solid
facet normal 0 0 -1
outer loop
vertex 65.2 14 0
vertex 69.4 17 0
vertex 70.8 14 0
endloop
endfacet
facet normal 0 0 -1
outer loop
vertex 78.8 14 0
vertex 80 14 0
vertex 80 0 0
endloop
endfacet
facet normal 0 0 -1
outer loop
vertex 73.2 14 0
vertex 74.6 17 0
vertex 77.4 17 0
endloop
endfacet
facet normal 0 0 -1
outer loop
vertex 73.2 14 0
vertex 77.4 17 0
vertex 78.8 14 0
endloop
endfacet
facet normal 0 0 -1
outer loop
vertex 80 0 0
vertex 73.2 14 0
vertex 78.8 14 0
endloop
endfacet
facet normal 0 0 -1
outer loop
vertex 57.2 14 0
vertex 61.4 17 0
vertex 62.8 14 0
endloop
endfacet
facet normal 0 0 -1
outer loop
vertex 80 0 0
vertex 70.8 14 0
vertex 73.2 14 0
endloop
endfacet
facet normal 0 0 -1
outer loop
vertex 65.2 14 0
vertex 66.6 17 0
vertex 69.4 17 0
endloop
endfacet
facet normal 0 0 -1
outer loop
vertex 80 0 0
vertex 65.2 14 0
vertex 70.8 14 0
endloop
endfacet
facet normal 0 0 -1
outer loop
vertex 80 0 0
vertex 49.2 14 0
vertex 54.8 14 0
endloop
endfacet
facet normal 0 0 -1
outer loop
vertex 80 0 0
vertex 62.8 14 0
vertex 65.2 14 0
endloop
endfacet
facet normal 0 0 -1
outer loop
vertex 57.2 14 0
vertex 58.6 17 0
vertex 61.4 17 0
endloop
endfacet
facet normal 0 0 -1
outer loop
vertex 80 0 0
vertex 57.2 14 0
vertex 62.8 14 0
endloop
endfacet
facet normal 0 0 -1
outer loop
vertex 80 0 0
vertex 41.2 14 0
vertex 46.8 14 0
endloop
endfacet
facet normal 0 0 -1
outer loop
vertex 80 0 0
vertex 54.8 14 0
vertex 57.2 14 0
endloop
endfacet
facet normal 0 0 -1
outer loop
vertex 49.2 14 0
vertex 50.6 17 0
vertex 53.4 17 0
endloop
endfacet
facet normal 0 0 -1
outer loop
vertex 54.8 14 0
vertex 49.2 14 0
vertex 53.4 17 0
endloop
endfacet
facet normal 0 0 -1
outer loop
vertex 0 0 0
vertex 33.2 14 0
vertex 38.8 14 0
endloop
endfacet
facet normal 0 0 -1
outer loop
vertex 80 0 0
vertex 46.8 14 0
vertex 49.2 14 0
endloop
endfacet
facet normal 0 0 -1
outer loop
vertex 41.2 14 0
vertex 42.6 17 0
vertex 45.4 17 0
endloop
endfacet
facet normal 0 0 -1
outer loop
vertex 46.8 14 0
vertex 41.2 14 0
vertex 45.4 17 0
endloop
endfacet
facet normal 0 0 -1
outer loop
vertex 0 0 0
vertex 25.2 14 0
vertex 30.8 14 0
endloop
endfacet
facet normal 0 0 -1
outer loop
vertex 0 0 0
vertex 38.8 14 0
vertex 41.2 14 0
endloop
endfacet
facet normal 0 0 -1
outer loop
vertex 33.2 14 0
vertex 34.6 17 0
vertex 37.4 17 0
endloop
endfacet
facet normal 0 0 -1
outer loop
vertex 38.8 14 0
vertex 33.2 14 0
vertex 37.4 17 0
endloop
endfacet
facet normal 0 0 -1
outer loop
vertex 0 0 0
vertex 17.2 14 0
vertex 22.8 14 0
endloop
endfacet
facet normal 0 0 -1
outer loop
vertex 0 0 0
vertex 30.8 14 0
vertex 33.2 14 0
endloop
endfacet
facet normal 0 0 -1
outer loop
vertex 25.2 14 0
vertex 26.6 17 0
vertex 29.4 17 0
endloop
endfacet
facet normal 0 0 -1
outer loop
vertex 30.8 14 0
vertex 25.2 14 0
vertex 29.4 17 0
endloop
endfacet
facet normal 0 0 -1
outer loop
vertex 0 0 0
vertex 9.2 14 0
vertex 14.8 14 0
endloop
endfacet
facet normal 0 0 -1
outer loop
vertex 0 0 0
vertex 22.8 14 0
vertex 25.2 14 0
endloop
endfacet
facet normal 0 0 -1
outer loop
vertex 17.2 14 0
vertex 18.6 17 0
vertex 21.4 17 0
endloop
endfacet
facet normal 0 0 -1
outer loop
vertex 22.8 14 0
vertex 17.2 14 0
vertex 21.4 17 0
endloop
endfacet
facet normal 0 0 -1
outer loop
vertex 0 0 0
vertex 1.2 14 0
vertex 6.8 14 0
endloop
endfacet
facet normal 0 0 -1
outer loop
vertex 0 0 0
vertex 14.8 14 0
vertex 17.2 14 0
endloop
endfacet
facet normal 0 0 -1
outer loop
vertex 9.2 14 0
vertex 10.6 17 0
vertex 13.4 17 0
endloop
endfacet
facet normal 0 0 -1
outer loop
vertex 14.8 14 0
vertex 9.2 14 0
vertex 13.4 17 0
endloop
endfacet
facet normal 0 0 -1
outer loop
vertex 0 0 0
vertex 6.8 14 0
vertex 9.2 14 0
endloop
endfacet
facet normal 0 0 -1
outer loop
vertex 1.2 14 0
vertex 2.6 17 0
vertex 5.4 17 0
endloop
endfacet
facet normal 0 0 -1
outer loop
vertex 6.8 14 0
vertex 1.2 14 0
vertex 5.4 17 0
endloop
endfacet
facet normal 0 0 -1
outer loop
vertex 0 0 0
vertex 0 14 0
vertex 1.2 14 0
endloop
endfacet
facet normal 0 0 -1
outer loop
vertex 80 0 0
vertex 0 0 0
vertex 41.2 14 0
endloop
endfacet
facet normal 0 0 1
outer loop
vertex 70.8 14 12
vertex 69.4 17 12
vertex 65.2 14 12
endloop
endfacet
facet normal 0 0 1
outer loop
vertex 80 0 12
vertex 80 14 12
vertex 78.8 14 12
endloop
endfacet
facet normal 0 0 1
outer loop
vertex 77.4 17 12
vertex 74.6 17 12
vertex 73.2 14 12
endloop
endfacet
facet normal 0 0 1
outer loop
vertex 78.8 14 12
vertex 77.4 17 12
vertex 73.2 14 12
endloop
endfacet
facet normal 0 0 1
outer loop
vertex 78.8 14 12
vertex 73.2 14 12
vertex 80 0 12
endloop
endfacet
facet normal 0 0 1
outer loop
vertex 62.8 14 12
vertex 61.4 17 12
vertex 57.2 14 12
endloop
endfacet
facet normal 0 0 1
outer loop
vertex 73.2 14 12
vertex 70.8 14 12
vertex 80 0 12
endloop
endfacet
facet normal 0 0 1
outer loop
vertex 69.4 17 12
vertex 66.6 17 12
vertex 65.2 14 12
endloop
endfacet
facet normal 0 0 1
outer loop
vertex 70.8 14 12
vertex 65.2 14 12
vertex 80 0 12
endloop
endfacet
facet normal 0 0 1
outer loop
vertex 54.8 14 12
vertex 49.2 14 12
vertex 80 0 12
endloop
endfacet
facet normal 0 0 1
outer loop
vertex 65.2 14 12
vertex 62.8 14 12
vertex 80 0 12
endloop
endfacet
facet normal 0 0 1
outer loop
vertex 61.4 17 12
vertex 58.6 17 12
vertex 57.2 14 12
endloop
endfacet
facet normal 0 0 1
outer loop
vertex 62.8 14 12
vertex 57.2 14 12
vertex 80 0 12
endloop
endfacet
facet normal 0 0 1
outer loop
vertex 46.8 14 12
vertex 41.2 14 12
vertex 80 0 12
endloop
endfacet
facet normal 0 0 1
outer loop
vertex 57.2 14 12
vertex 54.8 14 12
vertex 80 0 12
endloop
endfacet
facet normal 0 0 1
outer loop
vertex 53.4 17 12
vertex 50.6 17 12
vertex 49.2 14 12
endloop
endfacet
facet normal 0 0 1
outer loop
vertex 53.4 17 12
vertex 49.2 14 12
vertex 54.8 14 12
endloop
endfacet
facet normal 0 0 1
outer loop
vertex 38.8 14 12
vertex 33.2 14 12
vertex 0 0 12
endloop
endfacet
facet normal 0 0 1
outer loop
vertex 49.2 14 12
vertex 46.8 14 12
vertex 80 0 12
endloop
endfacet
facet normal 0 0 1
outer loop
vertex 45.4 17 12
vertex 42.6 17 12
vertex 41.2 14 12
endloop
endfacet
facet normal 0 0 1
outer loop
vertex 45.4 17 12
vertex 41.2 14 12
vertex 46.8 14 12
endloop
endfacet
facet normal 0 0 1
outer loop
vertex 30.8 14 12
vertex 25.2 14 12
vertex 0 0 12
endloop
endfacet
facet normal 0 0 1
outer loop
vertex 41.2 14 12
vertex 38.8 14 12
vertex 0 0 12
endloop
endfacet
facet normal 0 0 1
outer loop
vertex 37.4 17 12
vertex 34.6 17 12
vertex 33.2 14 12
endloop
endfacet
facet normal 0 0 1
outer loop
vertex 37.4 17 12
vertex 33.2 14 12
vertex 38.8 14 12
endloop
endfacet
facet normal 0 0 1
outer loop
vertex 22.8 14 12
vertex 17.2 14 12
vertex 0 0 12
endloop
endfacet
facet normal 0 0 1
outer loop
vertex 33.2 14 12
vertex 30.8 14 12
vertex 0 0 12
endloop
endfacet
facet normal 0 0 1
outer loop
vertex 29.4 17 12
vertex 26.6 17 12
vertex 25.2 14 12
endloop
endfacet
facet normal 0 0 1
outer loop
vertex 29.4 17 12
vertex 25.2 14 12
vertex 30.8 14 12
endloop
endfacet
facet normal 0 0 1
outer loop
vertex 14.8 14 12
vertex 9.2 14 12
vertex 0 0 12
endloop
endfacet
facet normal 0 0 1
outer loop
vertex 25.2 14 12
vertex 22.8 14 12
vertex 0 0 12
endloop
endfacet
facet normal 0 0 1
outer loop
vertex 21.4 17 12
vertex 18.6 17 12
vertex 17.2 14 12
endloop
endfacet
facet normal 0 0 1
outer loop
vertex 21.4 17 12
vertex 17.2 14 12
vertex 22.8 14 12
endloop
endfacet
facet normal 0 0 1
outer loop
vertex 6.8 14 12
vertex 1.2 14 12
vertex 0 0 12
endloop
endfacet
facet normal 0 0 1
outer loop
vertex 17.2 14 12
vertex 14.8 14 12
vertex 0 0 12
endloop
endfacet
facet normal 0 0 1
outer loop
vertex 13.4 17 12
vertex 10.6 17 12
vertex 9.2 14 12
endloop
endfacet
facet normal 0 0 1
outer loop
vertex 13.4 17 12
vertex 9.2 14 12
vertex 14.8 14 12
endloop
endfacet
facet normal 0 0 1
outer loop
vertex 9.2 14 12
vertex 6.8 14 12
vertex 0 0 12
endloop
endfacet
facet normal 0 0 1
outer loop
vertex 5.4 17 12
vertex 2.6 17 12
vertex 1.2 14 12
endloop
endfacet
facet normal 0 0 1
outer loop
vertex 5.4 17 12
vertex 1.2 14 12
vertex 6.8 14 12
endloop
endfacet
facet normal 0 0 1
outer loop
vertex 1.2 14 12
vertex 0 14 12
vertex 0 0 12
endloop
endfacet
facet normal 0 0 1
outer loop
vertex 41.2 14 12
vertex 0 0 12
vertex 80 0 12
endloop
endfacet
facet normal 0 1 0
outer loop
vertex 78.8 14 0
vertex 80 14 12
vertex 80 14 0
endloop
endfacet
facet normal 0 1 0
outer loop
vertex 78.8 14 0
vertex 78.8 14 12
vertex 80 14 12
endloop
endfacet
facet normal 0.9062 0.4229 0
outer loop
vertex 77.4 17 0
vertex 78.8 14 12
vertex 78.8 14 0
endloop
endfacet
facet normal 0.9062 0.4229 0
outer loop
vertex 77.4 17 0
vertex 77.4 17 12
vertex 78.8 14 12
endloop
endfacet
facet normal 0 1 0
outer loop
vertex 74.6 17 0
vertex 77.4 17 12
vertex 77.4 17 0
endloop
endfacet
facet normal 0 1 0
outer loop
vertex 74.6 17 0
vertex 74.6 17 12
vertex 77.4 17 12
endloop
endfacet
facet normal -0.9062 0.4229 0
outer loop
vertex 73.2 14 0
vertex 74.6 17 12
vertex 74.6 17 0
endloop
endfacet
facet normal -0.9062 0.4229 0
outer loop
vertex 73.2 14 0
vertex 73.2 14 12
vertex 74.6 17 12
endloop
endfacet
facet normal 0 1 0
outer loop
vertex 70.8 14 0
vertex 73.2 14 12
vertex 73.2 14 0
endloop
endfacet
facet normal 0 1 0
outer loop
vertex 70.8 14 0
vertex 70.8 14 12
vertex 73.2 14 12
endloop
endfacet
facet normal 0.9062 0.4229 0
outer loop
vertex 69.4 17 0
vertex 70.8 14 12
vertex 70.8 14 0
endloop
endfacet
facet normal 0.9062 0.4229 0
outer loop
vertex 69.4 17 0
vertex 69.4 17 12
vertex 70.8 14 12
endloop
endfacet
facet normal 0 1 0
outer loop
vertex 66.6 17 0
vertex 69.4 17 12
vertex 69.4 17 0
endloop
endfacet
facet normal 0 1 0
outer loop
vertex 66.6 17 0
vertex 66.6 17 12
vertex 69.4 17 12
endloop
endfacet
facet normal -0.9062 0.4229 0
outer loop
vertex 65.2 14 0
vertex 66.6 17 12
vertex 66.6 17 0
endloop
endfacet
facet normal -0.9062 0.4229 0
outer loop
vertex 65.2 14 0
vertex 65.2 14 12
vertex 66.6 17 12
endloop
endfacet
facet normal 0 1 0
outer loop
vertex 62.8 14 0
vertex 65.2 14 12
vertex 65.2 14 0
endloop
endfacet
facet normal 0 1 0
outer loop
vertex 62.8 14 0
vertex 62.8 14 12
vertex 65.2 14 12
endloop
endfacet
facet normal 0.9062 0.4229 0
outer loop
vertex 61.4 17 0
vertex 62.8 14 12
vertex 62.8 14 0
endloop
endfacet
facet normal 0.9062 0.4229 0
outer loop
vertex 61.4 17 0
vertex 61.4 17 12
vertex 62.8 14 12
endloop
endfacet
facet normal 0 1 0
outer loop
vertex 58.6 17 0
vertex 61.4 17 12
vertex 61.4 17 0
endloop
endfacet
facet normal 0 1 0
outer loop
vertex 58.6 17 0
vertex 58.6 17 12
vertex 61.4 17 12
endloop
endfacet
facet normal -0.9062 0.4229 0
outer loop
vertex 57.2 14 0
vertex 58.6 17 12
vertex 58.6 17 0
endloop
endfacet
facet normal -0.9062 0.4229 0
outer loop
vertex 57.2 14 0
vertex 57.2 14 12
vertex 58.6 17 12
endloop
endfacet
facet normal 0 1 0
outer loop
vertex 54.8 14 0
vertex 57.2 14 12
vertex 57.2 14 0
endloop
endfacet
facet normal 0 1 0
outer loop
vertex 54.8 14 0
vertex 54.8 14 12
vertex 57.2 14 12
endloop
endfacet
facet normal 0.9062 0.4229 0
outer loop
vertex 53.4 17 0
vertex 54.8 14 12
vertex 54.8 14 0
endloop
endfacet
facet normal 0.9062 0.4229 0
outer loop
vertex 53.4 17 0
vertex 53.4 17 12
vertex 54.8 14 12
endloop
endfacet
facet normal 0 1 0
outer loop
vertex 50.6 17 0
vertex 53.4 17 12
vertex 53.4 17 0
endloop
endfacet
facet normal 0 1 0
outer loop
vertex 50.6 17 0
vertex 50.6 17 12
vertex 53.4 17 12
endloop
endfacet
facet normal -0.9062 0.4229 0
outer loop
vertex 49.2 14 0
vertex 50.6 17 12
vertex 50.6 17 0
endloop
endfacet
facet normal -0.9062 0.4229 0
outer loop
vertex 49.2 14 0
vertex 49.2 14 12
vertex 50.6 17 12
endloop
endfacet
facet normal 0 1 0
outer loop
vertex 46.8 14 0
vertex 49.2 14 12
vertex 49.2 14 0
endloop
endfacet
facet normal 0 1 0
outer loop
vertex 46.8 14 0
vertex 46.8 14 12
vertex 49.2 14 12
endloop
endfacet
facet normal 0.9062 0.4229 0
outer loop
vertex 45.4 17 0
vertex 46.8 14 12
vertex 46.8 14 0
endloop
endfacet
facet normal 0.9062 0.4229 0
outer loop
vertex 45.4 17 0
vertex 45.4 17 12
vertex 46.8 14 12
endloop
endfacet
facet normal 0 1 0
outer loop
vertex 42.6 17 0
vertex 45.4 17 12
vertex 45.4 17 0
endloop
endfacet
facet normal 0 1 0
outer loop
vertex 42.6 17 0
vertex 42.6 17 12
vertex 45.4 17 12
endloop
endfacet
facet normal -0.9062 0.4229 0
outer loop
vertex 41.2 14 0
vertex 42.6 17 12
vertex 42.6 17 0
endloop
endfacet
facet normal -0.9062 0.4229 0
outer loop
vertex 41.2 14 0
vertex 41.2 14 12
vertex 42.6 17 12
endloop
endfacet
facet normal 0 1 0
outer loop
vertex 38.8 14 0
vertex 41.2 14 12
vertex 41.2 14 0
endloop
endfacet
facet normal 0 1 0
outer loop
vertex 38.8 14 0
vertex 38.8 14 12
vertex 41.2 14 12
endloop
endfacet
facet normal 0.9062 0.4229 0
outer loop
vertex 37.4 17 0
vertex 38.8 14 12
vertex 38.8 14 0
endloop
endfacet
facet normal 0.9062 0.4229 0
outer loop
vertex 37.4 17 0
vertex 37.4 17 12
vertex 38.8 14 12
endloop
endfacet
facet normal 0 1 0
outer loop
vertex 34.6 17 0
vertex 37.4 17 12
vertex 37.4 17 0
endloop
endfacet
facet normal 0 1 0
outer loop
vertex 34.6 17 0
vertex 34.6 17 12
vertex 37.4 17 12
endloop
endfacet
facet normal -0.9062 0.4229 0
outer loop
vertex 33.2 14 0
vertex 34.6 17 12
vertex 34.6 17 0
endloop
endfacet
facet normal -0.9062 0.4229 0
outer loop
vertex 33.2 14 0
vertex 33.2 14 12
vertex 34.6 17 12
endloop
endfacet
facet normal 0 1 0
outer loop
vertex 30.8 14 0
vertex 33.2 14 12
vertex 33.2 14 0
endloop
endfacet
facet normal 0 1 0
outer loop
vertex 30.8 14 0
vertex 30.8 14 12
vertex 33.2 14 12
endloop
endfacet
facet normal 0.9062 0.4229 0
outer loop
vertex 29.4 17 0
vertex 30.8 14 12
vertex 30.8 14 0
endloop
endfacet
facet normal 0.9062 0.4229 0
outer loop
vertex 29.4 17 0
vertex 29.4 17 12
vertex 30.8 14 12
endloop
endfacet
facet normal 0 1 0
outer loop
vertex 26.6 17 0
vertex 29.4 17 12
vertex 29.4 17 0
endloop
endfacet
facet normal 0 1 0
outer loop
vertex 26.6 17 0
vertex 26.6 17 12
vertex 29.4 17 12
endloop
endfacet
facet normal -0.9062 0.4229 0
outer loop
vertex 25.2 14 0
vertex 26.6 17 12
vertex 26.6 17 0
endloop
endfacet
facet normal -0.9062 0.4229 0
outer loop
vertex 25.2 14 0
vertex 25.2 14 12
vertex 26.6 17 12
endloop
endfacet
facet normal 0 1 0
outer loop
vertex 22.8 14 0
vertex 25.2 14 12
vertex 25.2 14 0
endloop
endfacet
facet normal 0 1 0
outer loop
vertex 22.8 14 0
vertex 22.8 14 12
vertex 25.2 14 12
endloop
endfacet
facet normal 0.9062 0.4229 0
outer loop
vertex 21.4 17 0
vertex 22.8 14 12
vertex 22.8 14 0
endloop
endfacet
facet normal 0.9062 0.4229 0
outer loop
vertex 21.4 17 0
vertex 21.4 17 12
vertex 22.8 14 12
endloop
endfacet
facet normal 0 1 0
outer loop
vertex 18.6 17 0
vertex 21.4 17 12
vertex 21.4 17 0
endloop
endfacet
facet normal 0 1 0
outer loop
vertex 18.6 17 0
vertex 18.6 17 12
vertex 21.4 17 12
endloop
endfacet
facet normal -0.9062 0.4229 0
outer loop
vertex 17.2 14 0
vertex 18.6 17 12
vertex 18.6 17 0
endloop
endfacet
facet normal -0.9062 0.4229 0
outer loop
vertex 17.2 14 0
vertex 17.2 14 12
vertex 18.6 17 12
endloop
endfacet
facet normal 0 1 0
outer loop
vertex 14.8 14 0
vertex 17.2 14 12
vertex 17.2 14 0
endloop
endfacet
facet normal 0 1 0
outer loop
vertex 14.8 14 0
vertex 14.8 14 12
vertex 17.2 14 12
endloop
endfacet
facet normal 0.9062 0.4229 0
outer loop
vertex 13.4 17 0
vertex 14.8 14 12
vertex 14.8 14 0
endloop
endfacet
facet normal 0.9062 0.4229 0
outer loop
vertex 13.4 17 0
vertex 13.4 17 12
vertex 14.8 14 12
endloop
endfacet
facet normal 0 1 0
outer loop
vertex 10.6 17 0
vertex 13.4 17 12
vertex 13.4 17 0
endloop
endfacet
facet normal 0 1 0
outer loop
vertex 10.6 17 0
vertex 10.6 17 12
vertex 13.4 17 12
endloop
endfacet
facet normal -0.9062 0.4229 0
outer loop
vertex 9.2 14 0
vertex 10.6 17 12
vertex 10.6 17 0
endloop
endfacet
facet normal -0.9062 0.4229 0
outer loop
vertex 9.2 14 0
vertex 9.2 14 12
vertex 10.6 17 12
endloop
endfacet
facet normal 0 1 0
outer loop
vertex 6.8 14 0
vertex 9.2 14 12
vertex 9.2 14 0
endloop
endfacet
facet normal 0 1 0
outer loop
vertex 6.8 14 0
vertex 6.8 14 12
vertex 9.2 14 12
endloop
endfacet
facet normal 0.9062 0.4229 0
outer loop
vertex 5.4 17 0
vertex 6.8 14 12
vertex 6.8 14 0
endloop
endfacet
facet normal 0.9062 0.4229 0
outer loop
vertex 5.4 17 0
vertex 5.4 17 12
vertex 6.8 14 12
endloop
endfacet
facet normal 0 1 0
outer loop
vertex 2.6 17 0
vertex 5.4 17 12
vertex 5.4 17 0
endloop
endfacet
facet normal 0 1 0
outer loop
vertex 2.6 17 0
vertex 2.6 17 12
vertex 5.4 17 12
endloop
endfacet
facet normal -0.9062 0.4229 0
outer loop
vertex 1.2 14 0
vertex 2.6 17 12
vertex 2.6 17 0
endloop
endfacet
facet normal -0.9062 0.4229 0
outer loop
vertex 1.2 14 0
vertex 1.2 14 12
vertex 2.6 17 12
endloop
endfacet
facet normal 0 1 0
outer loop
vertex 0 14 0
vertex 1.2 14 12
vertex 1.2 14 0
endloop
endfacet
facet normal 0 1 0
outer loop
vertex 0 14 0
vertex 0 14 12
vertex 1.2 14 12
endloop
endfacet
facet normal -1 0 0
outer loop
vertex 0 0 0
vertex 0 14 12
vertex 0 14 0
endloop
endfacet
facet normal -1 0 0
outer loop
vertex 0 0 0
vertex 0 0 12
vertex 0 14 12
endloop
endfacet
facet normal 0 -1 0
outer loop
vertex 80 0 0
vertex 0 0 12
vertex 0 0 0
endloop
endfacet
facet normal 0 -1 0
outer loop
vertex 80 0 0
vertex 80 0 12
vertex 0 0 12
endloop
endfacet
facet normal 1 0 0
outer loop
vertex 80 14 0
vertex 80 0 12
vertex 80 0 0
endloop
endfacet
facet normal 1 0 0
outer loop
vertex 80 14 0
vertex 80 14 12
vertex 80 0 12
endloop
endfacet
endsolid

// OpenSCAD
$fn = 32;

// ----------------------------------------------------------------------
// Gear rack: 10 teeth, pitch 8 mm
// ----------------------------------------------------------------------

// --- parameters (mm) ---
teeth = 10;               // number of teeth
pitch = 8;                // tooth pitch, X
root_w = 5.6;             // tooth width at the root
tip_w = 2.8;              // tooth width at the tip
base_h = 14;              // rack body height, Y
tooth_h = 3;              // tooth height above the body
plate_t = 12;             // rack width, Z (extrusion height)

rack_l = teeth * pitch;  // overall length
total_h = base_h + tooth_h;  // overall height

profile = [[0, 0], [80, 0], [80, 14], [78.8, 14], [77.4, 17], [74.6, 17], [73.2, 14], [70.8, 14], [69.4, 17], [66.6, 17], [65.2, 14], [62.8, 14], [61.4, 17], [58.6, 17], [57.2, 14], [54.8, 14], [53.4, 17], [50.6, 17], [49.2, 14], [46.8, 14], [45.4, 17], [42.6, 17], [41.2, 14], [38.8, 14], [37.4, 17], [34.6, 17], [33.2, 14], [30.8, 14], [29.4, 17], [26.6, 17], [25.2, 14], [22.8, 14], [21.4, 17], [18.6, 17], [17.2, 14], [14.8, 14], [13.4, 17], [10.6, 17], [9.2, 14], [6.8, 14], [5.4, 17], [2.6, 17], [1.2, 14], [0, 14]];  // primary outline, 44 points, counter clockwise

// --- the one profile operation ---
linear_extrude(height = plate_t) polygon(points = profile);
